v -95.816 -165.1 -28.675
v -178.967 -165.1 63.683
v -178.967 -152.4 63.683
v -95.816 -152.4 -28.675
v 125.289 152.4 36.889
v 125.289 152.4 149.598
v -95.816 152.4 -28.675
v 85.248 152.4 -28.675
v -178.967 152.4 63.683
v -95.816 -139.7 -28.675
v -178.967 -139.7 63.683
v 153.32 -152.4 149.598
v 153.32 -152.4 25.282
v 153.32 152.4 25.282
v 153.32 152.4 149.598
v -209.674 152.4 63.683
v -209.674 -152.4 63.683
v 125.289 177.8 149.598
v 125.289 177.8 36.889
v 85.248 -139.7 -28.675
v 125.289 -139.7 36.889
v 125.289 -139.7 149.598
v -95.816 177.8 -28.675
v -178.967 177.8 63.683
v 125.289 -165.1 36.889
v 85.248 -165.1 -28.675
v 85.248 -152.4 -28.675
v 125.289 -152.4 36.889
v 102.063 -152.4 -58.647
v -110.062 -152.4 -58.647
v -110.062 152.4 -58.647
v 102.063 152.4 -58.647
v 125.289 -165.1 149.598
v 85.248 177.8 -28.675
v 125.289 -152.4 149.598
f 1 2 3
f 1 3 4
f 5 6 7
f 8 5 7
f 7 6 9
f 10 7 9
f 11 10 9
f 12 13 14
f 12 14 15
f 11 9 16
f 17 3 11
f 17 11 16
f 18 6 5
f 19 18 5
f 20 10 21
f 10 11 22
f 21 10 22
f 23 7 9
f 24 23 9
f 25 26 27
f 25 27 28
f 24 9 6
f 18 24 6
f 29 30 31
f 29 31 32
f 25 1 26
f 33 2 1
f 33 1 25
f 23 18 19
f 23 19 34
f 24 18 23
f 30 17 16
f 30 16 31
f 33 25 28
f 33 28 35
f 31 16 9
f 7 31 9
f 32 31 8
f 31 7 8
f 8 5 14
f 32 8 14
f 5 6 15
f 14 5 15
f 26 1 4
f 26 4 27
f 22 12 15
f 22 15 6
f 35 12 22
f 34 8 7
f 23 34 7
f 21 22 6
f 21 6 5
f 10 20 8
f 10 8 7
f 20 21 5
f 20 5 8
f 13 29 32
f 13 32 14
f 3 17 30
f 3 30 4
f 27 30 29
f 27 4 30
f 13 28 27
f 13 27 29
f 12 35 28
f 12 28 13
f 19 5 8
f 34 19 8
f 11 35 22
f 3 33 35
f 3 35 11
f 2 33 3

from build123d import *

# Parameters (mm, degrees)
F1_DEPTH = 152.4
F3_DEPTH = 12.7
F5_DEPTH = 25.4


with BuildPart() as f1:
    # F0 (on Front) → F1 (new body, symmetric)
    with BuildSketch(Plane.XZ):
        Polygon((85.248322, -28.674914), (-32.316173, -28.674914), (-95.816173, -28.674914), (-178.967252, 63.682506), (-209.674103, 63.682506), (-110.062133, -58.646913), (-32.316173, -58.646913), (102.063274, -58.646913), (153.320322, 25.282022), (153.320322, 149.59761), (125.289187, 149.59761), (125.289187, 36.888502), align=None)
    extrude(amount=F1_DEPTH, both=True)

    # F2 (on face) → F3 (join, symmetric)
    with BuildSketch(Plane.XZ.offset(152.4)):
        Polygon((125.289187, 149.59761), (-178.967252, 63.682506), (-95.816173, -28.674914), (85.248322, -28.674914), (125.289187, 36.888502), align=None)
    extrude(amount=F3_DEPTH, both=True)


with BuildPart() as f5:
    # F4 (on face) → F5 (new body)
    with BuildSketch(Plane(origin=(0, 152.4, 0), x_dir=(-1, 0, 0), z_dir=(0, 1, 0))):
        Polygon((178.967252, 63.682506), (-125.289187, 149.59761), (-125.289187, 36.888502), (-85.248322, -28.674914), (95.816173, -28.674914), align=None)
    extrude(amount=F5_DEPTH)


solid = Compound([f1.part, f5.part])
